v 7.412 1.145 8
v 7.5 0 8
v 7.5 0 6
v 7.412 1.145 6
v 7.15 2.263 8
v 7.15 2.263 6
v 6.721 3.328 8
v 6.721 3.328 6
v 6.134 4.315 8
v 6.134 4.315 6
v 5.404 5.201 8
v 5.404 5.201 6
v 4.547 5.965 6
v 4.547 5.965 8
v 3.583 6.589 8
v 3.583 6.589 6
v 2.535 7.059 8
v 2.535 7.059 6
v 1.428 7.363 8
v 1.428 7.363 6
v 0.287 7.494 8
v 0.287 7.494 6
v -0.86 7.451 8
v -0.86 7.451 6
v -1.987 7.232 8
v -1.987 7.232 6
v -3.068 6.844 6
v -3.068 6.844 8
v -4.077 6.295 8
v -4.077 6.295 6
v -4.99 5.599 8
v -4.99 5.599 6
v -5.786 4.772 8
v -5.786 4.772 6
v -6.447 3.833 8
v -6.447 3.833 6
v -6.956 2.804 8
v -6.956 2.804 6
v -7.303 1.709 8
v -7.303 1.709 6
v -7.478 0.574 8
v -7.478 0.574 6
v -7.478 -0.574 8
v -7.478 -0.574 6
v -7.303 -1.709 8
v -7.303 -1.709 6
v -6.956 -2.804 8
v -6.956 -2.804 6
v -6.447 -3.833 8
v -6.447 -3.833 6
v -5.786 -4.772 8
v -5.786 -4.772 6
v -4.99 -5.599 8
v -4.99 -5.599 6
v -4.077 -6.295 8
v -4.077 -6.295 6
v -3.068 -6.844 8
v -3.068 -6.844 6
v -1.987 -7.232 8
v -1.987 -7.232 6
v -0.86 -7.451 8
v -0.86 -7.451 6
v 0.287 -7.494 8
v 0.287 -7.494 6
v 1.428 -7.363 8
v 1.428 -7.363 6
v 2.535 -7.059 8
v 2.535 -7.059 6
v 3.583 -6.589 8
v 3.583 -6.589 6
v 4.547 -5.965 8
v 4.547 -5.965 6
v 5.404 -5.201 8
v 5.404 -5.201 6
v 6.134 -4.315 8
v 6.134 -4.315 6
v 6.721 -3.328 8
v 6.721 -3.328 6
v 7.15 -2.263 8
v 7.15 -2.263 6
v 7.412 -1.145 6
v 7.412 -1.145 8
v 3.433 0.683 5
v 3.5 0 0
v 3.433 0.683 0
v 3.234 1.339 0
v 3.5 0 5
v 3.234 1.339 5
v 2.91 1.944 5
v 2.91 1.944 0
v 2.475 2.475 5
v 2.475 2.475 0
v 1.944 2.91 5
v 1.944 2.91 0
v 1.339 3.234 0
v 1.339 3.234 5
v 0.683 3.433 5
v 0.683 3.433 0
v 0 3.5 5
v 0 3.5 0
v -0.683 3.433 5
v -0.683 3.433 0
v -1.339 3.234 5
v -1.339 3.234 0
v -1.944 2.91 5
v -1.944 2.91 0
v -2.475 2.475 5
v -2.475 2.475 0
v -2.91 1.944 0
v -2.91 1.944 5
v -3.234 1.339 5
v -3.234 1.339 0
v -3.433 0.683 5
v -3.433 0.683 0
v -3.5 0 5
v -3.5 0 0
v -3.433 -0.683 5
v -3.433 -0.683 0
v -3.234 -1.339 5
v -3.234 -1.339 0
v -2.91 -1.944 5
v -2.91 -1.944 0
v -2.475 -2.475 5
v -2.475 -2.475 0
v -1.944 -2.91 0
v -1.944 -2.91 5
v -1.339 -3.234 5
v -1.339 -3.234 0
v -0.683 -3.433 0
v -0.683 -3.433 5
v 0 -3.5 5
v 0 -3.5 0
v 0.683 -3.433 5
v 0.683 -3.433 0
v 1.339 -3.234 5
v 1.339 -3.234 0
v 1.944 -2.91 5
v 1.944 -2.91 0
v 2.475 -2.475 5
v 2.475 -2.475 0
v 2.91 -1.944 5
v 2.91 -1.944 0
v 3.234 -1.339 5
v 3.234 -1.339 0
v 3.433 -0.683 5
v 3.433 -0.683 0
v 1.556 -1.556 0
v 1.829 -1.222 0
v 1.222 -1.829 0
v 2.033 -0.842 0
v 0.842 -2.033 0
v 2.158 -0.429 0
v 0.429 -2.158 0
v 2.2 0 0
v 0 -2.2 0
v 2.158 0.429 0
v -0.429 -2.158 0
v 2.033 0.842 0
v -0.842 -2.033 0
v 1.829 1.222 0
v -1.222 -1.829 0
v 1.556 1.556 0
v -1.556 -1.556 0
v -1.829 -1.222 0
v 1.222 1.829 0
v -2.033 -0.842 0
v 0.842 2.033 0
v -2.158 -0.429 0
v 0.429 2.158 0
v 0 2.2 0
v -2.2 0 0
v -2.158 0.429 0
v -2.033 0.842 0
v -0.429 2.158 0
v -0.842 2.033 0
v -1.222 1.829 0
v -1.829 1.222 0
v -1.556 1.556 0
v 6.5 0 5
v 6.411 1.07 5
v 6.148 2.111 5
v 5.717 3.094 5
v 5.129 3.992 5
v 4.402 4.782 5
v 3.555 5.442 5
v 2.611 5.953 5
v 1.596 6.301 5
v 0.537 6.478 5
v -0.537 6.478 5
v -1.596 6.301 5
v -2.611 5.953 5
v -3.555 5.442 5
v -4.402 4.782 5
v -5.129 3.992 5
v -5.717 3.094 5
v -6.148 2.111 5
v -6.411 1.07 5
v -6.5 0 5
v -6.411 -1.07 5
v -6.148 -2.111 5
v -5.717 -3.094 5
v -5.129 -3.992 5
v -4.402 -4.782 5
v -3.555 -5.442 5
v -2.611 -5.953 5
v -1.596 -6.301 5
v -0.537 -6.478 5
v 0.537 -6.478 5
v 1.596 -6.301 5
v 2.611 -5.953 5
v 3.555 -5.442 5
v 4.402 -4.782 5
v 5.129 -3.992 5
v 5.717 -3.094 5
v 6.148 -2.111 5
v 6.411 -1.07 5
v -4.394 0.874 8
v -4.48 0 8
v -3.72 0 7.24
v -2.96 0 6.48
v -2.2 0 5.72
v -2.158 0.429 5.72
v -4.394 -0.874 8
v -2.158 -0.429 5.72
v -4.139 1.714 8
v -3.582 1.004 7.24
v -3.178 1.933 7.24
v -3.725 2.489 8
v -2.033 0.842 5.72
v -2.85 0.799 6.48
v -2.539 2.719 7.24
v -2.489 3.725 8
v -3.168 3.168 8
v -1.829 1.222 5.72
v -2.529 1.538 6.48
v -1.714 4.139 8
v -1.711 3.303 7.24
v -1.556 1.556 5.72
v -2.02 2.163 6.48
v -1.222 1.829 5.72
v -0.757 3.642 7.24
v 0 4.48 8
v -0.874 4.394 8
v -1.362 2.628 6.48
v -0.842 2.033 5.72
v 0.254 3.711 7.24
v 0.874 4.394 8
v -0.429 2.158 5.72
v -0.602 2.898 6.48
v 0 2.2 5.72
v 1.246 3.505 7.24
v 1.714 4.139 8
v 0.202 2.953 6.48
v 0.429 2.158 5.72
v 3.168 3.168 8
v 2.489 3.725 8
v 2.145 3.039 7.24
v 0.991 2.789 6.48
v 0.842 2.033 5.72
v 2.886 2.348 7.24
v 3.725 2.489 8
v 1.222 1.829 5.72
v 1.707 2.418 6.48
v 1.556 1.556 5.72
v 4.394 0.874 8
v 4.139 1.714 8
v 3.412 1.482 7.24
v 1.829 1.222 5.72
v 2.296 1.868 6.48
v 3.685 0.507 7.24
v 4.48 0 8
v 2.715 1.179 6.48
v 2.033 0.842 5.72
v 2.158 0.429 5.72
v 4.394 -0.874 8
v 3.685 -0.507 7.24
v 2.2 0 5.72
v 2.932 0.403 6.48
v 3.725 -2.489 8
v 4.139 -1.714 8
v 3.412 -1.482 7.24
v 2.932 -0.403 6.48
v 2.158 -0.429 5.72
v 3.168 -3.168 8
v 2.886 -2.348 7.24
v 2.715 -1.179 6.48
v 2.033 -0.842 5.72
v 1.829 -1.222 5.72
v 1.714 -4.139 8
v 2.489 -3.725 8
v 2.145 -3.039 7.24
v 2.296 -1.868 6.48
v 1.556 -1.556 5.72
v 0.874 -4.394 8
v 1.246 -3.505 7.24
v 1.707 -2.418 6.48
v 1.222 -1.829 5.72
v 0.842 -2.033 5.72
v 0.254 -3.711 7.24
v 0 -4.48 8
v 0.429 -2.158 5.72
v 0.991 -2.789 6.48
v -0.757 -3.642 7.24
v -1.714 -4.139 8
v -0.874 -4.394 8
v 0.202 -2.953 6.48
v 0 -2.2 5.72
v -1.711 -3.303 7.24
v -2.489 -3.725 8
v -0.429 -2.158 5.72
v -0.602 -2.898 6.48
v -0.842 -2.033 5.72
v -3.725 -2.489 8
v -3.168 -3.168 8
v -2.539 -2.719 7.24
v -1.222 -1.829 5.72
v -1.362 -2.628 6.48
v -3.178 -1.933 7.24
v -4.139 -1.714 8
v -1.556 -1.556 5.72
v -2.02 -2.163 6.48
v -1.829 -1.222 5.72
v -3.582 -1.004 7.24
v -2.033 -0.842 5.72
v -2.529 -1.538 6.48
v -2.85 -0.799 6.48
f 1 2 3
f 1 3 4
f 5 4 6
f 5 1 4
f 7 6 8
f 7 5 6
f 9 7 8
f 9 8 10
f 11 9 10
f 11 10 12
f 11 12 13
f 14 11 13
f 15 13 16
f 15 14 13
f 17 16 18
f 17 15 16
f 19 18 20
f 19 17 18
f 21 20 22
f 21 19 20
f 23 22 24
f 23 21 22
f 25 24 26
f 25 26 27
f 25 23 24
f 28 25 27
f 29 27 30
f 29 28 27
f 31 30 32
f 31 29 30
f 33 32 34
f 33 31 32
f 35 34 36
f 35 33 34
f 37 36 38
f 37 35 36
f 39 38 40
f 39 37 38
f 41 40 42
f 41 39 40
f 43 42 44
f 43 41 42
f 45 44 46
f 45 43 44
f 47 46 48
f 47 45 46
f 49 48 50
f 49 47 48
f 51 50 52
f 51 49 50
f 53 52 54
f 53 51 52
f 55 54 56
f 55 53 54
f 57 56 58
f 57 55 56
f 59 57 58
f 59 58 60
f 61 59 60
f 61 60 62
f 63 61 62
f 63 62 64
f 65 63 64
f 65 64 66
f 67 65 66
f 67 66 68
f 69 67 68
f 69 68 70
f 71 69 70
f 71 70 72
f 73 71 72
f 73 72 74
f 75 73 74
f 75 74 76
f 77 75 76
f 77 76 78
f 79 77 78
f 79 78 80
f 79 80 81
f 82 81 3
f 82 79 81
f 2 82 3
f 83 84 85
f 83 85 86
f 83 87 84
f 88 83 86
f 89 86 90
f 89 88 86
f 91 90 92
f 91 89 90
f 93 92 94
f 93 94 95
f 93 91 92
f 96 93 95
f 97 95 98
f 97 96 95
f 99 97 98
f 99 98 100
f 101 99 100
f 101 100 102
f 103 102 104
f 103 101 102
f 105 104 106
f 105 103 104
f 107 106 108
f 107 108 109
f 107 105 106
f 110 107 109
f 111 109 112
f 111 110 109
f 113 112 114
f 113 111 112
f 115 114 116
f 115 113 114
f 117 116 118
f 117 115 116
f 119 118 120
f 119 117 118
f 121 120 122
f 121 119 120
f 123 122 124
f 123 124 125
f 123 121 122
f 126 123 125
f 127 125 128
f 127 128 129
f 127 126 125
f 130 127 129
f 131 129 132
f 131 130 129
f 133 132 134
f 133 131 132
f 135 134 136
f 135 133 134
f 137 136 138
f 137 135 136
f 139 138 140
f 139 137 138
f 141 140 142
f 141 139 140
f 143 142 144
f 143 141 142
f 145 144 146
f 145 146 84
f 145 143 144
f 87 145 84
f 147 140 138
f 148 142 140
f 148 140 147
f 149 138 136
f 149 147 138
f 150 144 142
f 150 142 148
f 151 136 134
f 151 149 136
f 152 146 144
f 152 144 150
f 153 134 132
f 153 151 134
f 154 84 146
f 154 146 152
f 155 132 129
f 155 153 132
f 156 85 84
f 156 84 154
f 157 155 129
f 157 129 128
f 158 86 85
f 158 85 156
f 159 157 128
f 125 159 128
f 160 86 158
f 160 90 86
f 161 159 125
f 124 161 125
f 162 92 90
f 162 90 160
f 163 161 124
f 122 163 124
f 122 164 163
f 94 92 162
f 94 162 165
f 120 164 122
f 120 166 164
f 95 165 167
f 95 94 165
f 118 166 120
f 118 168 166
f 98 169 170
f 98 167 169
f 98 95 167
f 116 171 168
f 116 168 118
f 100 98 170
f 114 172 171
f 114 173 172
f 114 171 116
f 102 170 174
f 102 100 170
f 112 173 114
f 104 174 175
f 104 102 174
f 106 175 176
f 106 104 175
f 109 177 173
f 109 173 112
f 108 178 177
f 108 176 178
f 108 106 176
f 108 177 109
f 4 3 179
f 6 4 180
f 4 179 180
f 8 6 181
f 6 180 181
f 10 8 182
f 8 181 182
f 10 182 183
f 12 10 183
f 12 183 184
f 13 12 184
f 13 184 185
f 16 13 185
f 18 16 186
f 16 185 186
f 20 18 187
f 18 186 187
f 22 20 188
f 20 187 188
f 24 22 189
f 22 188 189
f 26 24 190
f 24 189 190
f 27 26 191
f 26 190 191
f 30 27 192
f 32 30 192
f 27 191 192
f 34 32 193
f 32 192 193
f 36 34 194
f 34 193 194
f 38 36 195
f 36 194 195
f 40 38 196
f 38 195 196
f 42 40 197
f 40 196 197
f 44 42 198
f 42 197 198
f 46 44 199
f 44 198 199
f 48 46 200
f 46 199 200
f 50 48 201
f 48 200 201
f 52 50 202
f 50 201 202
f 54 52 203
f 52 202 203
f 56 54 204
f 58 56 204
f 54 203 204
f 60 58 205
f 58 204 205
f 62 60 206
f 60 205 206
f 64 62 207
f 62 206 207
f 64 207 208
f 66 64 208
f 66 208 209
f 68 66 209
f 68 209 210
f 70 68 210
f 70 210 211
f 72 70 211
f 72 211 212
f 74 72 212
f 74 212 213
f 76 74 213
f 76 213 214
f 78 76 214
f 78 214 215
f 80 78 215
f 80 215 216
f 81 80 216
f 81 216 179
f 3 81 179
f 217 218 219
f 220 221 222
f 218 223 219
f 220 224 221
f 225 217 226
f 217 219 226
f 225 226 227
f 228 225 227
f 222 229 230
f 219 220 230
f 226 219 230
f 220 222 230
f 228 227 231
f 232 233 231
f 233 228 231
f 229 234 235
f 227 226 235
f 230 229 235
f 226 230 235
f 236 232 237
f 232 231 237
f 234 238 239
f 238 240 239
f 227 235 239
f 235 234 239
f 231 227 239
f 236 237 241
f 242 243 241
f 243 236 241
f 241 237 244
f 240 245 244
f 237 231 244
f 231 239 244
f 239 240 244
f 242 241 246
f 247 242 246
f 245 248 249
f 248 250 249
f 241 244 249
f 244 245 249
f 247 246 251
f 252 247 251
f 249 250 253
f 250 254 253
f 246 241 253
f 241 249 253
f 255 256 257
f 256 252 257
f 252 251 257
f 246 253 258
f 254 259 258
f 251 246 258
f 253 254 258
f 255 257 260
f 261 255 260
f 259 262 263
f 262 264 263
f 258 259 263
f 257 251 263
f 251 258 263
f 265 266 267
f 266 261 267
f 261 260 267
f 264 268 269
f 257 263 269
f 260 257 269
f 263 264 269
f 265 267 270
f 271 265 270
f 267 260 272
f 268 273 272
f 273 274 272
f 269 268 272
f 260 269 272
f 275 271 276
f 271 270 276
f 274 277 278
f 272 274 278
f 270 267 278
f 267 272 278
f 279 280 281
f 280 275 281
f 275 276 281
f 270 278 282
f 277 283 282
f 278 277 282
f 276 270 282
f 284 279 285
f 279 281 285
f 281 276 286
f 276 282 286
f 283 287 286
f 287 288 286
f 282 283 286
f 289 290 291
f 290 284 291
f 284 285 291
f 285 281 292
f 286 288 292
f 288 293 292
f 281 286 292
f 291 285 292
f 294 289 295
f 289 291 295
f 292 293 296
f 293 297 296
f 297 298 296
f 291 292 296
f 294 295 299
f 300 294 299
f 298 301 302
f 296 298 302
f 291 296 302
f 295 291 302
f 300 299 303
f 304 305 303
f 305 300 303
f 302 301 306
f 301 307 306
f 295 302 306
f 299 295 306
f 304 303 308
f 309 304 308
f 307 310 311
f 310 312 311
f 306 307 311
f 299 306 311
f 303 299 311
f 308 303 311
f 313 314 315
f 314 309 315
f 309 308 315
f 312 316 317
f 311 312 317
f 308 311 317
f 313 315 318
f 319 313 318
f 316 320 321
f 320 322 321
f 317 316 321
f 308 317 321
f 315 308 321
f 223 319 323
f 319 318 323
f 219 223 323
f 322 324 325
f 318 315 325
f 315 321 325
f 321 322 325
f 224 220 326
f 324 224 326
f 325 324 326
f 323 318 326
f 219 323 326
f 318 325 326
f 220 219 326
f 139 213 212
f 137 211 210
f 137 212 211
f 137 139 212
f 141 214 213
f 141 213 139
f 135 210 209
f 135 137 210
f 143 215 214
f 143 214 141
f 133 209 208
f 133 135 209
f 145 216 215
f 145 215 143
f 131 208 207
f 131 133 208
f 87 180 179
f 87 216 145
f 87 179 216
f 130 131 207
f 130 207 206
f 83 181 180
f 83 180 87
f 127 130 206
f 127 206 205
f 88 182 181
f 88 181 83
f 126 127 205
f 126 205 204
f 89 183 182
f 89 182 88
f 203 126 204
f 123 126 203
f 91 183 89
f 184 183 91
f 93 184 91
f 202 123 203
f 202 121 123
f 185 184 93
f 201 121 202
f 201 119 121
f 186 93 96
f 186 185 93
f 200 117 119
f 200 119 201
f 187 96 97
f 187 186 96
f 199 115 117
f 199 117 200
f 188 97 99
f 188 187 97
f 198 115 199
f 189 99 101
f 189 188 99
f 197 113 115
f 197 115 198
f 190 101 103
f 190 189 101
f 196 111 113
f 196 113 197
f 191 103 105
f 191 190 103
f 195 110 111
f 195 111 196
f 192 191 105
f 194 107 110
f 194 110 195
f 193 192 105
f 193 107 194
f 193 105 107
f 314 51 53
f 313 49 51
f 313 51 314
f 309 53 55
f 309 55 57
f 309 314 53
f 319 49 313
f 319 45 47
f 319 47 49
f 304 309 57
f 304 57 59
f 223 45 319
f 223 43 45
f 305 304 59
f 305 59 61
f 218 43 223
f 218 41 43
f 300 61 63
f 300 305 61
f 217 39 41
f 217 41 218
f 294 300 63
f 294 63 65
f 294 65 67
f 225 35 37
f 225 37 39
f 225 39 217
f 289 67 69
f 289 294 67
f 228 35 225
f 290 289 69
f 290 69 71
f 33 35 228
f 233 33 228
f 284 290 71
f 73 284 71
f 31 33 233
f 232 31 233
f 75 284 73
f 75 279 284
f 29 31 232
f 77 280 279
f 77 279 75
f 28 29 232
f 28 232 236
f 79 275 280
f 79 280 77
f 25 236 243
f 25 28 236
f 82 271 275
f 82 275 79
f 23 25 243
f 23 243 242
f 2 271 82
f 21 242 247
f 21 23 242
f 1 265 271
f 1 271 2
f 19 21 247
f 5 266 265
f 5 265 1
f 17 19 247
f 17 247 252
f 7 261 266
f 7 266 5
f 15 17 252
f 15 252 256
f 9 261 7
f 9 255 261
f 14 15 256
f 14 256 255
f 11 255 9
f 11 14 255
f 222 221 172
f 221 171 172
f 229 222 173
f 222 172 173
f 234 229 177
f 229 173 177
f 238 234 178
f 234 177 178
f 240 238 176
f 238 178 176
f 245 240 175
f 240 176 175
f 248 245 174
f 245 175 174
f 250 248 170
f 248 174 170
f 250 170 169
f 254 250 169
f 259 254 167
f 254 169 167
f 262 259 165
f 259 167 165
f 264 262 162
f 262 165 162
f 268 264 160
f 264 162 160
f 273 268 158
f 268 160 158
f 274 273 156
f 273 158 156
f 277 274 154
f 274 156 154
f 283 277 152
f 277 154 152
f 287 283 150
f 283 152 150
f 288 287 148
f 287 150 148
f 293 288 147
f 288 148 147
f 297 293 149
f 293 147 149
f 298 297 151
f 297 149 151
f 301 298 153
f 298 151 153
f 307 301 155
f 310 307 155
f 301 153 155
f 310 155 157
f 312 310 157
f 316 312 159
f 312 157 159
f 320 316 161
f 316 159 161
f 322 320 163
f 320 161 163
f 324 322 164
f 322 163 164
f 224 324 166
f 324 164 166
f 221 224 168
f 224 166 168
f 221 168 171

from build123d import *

# Parameters (mm, degrees)
F3_D           = 4.4
F3_CSINK_D     = 8.96
F3_CSINK_ANGLE = 90
F4_SIZE        = 1


with BuildPart() as f1:
    # F0 (on Front) → F1 (revolve)
    with BuildSketch(Plane.XZ):
        Polygon((0, 8), (0, 0), (3.5, 0), (3.5, 5), (7.5, 5), (7.5, 8), align=None)
    revolve(axis=Axis((0, 0, 4), (0, 0, 1)))

    # F3 (through all)
    with Locations(Plane.XY.offset(8)):
        with Locations((0, 0)):
            CounterSinkHole(F3_D / 2, F3_CSINK_D / 2, counter_sink_angle=F3_CSINK_ANGLE)

    # F4
    f4_edges = [f1.edges().sort_by_distance(p)[0] for p in [
        (-7.5, 0, 5),
    ]]
    chamfer(f4_edges, length=F4_SIZE)


solid = f1.part
